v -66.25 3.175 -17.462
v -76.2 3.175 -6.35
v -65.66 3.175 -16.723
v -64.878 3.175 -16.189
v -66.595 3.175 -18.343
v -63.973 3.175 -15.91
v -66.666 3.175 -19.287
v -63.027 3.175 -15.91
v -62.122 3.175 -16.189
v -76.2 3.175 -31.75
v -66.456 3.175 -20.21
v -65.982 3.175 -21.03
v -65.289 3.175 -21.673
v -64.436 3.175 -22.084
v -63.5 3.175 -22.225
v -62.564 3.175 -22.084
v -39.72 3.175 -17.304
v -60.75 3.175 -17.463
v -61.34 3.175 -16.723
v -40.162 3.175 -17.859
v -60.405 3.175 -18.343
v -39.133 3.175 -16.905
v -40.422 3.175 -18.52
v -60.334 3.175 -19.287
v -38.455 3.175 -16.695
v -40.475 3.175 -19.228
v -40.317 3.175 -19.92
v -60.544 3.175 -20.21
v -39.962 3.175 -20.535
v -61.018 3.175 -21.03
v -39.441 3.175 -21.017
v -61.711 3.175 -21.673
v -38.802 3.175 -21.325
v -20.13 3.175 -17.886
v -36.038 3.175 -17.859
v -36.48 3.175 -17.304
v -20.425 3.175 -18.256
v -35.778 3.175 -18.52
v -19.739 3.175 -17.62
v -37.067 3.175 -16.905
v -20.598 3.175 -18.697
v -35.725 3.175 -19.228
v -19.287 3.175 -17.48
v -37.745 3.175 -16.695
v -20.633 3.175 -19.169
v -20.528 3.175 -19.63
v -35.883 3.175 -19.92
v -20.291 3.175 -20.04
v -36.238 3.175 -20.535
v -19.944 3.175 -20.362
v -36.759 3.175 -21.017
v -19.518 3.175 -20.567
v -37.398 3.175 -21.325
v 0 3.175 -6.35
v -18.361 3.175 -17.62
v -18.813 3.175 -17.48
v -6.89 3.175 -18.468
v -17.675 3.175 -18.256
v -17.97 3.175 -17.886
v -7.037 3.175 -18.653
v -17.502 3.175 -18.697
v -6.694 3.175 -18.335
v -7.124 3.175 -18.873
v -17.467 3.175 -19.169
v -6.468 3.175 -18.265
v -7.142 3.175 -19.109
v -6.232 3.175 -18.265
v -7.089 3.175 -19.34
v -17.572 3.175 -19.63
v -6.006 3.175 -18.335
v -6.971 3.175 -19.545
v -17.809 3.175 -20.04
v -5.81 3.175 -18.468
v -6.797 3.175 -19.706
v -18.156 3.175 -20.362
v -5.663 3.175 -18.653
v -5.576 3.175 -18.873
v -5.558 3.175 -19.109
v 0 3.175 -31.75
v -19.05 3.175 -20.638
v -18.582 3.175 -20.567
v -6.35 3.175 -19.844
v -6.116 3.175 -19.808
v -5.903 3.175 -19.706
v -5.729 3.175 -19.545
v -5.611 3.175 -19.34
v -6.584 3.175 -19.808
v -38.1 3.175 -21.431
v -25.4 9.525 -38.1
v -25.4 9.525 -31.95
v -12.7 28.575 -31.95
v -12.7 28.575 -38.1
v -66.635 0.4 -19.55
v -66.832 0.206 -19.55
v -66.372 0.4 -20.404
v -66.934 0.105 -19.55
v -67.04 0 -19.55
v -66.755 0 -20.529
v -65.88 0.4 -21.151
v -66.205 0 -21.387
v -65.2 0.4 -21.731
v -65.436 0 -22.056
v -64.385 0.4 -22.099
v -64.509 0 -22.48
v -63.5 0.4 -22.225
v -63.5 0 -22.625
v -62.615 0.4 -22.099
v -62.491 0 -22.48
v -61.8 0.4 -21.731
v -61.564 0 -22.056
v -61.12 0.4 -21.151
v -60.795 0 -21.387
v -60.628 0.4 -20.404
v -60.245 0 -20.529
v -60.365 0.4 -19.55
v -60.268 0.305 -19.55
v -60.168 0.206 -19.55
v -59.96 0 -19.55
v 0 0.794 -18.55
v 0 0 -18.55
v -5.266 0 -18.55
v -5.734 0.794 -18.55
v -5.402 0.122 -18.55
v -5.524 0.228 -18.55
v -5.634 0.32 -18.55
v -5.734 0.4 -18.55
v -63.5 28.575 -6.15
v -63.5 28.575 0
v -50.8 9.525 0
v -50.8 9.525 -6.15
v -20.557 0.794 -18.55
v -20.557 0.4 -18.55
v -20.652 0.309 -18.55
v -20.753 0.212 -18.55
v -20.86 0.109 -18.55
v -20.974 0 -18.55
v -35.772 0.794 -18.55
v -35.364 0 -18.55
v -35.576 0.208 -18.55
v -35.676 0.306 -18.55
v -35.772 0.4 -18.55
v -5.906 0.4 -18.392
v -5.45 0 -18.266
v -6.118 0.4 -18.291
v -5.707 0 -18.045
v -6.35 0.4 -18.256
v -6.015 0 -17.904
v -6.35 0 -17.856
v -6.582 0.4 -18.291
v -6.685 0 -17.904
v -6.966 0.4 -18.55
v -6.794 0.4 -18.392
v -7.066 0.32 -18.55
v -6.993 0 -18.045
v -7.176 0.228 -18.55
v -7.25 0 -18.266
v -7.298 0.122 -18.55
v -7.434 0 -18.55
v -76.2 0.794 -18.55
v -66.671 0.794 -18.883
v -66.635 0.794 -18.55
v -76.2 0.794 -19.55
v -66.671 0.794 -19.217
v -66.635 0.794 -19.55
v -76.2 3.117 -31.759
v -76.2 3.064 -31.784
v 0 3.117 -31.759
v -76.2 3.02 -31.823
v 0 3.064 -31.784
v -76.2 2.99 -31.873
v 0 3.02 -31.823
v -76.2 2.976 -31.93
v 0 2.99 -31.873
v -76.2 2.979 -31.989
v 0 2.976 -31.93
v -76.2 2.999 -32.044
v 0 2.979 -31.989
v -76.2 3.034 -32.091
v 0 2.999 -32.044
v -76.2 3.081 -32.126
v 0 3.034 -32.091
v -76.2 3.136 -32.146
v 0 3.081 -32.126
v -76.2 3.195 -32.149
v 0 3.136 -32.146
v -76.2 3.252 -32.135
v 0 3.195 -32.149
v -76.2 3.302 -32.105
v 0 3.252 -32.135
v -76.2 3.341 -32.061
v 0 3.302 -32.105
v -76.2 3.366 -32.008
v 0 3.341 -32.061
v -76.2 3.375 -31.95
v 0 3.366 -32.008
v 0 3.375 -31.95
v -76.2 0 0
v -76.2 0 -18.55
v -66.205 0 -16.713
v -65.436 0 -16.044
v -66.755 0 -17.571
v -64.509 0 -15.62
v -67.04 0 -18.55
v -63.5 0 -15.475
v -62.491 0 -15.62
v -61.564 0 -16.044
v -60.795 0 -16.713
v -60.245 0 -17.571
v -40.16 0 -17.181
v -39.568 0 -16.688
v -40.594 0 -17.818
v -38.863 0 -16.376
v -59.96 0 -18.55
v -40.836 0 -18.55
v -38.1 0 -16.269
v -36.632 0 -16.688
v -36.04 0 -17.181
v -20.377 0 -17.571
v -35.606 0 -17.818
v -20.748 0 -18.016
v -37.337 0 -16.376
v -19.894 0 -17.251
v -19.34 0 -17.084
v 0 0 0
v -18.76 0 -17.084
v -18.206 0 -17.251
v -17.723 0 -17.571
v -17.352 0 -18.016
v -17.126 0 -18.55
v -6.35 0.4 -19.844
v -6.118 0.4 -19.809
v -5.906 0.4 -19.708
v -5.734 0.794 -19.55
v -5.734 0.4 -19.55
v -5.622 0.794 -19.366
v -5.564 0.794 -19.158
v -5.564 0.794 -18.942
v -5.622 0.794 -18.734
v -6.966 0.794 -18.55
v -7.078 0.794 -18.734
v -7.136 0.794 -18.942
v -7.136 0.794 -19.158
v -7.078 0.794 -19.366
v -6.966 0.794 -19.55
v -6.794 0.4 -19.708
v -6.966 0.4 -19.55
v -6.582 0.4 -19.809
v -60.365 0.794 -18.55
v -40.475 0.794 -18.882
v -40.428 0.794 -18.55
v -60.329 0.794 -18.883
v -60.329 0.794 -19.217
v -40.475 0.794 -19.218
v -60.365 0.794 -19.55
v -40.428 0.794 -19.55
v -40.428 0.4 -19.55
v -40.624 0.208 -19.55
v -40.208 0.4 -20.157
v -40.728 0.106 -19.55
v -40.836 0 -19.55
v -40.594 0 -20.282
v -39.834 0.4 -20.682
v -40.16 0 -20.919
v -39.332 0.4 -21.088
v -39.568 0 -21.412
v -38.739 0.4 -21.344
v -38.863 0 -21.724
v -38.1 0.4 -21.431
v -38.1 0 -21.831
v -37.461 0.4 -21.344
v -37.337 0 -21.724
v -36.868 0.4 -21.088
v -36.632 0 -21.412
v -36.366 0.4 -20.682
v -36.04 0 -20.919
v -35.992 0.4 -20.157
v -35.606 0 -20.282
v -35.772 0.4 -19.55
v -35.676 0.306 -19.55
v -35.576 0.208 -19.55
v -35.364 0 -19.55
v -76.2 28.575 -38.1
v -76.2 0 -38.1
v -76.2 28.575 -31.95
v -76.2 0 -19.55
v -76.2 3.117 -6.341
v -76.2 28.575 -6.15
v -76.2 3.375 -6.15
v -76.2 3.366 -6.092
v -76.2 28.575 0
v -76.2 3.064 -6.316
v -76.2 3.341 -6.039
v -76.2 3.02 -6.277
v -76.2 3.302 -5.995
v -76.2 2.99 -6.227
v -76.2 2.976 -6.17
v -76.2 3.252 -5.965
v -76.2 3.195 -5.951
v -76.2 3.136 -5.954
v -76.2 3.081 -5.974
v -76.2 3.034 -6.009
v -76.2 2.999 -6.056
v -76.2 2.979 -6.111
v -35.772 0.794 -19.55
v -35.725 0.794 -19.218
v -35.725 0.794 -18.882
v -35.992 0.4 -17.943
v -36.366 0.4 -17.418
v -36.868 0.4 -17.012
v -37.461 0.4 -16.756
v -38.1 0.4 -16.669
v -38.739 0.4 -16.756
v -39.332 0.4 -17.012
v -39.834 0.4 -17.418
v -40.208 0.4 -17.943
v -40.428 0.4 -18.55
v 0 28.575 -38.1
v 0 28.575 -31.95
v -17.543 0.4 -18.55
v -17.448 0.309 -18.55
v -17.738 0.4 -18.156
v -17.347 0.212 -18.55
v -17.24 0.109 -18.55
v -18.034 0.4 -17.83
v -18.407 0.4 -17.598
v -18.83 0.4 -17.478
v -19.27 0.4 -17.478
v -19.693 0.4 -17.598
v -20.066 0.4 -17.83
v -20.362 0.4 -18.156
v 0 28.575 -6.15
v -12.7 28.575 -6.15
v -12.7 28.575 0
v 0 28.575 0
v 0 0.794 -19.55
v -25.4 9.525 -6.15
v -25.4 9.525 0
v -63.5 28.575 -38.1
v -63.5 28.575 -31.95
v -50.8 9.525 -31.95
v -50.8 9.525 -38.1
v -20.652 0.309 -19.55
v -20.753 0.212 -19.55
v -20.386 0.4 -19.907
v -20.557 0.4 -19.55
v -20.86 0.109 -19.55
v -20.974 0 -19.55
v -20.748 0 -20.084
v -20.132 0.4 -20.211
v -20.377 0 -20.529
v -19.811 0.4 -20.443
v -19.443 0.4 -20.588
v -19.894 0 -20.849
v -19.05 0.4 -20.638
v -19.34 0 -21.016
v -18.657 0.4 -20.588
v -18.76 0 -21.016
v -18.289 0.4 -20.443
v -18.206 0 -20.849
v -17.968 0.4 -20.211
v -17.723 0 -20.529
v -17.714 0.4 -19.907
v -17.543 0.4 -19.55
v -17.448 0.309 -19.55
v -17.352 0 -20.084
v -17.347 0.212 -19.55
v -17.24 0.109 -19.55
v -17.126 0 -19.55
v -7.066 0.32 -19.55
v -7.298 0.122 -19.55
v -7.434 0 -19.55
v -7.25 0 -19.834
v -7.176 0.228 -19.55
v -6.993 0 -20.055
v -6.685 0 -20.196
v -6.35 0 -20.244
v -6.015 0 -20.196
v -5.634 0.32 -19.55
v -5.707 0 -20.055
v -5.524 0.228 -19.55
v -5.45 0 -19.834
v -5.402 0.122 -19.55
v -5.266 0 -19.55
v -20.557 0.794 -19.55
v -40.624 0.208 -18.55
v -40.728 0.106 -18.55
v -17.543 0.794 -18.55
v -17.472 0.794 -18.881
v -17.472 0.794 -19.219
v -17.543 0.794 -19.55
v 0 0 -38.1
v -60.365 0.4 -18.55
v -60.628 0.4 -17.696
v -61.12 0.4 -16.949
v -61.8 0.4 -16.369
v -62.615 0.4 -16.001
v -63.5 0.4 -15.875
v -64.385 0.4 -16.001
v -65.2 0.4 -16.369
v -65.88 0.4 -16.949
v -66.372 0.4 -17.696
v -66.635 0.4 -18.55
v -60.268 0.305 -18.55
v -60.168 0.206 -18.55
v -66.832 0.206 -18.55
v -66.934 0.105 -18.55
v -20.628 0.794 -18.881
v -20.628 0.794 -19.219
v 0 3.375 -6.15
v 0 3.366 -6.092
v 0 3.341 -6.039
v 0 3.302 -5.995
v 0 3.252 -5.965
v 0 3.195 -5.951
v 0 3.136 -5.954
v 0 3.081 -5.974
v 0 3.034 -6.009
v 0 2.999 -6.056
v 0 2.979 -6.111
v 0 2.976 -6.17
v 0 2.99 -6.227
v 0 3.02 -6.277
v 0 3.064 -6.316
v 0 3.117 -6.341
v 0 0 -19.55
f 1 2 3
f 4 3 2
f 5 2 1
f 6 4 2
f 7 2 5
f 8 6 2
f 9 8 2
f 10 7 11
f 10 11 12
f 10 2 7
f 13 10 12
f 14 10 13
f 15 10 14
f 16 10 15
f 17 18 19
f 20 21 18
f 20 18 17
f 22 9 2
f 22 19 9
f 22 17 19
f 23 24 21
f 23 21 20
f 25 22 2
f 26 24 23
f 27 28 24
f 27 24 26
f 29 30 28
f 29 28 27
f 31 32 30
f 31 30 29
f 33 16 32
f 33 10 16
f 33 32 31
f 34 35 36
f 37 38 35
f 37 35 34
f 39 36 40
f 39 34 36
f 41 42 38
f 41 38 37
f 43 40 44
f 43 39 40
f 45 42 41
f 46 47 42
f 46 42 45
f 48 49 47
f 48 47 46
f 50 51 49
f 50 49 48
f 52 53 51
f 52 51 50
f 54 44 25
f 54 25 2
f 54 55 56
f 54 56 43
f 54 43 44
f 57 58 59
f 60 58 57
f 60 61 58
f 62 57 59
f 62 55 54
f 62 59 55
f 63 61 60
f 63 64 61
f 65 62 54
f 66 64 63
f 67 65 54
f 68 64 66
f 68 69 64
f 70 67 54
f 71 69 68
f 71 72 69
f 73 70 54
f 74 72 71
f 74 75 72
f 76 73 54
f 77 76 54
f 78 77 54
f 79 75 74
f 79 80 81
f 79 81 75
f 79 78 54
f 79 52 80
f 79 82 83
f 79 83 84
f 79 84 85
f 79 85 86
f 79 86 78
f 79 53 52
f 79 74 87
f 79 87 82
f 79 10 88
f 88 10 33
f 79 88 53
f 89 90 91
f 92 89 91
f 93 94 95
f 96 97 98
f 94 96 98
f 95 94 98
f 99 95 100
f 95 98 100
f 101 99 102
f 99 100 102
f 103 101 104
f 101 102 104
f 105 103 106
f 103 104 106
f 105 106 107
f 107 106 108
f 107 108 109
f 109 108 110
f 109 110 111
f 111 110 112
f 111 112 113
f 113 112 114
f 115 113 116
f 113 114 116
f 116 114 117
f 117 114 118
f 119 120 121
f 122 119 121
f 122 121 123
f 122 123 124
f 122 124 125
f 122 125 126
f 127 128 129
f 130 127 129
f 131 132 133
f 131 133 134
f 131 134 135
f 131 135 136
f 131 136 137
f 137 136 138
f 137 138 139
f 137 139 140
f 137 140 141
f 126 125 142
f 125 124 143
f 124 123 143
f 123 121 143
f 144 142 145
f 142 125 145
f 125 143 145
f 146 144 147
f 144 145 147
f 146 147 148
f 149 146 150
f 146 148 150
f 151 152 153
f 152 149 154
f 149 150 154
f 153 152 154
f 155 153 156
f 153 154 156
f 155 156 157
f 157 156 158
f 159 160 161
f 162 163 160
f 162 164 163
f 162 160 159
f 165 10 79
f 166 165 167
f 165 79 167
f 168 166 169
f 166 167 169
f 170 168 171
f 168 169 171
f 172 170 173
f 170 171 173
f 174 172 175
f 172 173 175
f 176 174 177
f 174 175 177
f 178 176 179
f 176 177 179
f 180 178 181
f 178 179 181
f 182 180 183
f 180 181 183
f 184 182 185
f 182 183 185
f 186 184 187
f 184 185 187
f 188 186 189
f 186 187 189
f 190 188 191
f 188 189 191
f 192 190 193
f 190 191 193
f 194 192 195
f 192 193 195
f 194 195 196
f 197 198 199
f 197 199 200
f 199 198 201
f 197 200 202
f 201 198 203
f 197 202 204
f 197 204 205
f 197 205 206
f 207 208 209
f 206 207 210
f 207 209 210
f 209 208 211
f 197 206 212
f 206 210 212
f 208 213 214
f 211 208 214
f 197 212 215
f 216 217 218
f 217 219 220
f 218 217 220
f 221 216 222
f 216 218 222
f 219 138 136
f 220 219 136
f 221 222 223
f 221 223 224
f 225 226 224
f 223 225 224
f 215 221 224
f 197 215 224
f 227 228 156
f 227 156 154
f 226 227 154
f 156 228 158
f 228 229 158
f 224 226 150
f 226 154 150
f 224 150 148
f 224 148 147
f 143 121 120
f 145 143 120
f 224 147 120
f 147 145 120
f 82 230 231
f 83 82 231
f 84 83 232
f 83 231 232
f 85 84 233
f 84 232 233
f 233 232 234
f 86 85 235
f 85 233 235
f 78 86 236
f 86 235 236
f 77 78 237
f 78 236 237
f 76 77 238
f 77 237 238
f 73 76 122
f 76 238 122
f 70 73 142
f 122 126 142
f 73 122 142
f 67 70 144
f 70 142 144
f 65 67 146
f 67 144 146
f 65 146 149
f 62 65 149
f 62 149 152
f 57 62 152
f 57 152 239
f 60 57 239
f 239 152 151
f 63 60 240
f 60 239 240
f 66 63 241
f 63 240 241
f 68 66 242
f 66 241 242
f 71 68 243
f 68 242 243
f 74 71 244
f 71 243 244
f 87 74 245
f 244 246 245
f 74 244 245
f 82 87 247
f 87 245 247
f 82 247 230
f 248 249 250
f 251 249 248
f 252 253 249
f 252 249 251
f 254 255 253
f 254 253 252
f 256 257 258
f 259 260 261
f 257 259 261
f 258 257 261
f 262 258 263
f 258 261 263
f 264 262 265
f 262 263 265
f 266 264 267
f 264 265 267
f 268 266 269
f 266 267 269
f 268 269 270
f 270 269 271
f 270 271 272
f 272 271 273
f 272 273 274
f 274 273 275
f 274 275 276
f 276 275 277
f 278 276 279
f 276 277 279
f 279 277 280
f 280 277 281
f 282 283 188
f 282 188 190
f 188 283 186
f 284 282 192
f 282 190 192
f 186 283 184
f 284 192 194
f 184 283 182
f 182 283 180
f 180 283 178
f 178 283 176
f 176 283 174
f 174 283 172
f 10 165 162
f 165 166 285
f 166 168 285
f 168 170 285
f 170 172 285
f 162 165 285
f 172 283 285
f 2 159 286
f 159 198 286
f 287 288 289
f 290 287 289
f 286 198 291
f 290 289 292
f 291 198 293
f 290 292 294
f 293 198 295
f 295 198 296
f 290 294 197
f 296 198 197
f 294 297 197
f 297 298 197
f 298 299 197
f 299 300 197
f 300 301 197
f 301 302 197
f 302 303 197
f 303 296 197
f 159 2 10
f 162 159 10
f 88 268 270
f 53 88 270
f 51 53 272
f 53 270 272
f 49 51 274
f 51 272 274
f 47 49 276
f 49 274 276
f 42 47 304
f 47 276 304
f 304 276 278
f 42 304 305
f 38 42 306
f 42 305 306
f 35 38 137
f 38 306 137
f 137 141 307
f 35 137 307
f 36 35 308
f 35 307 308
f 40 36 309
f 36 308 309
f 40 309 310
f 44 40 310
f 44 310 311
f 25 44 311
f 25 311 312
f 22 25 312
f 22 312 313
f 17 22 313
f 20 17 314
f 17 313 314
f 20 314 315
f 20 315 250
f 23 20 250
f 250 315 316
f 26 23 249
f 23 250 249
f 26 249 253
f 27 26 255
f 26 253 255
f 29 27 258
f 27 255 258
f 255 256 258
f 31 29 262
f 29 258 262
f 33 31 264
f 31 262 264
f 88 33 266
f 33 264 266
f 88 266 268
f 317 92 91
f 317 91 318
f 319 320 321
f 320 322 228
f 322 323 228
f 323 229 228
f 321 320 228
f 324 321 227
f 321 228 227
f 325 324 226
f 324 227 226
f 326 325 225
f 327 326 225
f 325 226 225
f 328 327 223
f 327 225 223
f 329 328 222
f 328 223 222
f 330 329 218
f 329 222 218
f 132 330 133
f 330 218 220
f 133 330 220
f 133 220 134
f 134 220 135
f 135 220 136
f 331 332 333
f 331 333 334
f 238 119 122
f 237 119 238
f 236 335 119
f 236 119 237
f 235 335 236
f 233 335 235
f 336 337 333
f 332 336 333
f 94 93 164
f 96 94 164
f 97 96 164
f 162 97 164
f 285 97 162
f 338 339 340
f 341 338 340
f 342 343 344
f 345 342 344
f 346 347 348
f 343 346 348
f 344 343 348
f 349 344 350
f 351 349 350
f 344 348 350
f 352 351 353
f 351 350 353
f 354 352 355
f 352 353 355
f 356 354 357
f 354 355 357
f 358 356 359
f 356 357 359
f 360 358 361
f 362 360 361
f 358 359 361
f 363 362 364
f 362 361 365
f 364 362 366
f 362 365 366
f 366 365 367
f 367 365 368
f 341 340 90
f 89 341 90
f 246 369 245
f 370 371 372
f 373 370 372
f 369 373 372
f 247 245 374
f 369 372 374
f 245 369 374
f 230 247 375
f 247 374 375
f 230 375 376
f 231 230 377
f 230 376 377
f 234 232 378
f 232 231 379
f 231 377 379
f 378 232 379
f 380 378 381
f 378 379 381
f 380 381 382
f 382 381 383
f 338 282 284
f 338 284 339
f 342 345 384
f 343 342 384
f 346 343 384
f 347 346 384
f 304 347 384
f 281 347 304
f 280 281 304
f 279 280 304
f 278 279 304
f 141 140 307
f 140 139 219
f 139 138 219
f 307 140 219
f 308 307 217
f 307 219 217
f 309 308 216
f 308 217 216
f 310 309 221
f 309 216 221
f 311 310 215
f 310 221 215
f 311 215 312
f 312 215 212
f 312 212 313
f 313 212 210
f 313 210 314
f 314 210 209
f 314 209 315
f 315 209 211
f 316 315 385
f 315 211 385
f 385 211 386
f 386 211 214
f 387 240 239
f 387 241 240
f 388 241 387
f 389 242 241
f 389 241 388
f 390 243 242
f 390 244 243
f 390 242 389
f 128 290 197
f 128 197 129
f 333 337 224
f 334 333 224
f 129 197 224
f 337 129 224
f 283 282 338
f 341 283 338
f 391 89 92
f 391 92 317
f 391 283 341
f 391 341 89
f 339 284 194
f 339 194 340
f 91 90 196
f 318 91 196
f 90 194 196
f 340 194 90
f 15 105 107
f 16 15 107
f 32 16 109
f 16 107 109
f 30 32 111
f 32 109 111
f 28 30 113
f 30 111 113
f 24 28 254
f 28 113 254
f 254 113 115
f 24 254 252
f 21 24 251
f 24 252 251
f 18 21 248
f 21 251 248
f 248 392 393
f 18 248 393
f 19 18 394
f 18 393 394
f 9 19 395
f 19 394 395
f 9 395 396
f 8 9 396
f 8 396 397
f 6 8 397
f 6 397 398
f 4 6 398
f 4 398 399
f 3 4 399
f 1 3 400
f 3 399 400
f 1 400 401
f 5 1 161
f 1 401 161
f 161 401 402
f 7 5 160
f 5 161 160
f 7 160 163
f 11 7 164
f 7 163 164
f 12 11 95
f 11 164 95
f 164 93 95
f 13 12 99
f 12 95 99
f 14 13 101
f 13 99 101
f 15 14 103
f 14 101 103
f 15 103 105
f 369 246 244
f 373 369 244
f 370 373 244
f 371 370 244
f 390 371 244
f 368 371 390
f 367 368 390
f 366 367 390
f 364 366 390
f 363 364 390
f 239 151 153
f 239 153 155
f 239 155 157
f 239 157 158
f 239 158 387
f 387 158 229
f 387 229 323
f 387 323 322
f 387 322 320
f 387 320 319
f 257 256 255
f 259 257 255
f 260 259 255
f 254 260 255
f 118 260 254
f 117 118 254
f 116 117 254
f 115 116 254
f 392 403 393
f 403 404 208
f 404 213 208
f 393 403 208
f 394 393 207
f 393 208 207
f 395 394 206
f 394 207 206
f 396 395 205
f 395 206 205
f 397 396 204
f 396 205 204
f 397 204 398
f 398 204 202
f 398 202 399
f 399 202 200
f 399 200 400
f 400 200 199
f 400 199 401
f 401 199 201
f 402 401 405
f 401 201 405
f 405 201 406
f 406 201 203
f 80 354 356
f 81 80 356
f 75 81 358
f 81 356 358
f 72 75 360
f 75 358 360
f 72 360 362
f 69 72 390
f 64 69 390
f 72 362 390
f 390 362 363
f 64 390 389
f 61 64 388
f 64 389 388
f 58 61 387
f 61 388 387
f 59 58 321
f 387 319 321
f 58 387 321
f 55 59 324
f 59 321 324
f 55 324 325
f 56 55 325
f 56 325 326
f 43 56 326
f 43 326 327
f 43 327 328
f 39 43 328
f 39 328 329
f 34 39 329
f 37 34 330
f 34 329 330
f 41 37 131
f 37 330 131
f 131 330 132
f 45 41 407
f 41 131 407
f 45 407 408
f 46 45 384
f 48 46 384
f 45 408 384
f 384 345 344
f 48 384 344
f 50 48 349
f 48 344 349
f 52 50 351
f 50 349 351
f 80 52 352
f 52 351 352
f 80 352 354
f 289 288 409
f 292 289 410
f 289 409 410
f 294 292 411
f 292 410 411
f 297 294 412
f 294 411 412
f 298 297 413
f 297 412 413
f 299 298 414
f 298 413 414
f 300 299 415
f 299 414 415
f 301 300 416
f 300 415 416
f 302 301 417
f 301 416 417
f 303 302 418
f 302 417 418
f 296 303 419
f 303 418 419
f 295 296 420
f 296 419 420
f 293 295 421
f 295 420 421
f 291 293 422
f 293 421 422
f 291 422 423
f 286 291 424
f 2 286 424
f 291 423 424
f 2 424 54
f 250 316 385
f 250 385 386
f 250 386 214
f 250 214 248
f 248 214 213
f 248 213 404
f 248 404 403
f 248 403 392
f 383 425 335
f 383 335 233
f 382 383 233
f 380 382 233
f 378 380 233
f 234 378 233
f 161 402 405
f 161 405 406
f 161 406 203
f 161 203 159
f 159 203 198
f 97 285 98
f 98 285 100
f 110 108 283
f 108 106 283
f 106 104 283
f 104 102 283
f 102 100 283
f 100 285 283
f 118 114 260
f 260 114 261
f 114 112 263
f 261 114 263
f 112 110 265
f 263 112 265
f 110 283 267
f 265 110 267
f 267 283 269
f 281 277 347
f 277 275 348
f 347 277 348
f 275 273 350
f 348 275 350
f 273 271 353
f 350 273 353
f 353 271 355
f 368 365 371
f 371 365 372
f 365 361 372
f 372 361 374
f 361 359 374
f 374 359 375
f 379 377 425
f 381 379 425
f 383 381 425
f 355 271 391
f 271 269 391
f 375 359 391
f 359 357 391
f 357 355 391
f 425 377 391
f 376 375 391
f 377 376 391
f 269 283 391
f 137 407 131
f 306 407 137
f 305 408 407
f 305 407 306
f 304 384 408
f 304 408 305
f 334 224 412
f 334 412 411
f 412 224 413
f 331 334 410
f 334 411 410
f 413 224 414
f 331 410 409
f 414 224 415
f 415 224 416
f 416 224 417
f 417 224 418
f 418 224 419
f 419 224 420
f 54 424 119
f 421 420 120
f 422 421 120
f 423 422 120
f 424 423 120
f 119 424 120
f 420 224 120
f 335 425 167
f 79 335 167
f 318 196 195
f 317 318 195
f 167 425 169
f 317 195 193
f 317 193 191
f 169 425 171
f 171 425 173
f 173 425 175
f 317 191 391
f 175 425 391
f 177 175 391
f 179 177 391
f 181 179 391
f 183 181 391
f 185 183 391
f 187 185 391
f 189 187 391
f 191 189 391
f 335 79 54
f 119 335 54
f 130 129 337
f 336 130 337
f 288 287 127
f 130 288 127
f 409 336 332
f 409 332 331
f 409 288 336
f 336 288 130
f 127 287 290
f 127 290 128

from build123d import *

# Parameters (mm, degrees)
SKETCH2_W             = 76.2
SKETCH2_H             = 6.15
BOSS_EXTRUDE1_DEPTH   = 28.575
BOSS_EXTRUDE1_2_DEPTH = 28.575
SKETCH2_3_W           = 76.2
SKETCH2_3_H           = 25.8
BOSS_EXTRUDE2_DEPTH   = 3.175
CUT_EXTRUDE2_DEPTH    = 90.858670283
SKETCH4_R             = 3.175
SKETCH4_R_2           = 2.38125
SKETCH4_R_3           = 1.5875
SKETCH4_R_4           = 0.79375
CUT_EXTRUDE3_DEPTH    = 90.858670283
SKETCH5_R             = 0.2
CUT_EXTRUDE4_DEPTH    = 90.858670283
CHAMFER1_SIZE         = 0.4
SKETCH6_W             = 76.2
SKETCH6_H             = 1
CUT_EXTRUDE5_DEPTH    = 0.79375


with BuildPart() as part:
    # Sketch2 → Boss-Extrude1 (new body)
    with BuildSketch(Plane(origin=(0, 0, 0), x_dir=(1, 0, 0), z_dir=(0, 1, 0))):
        with Locations((-38.1, 3.075)):
            Rectangle(SKETCH2_W, SKETCH2_H)
    extrude(amount=BOSS_EXTRUDE1_DEPTH)



with BuildPart() as body_2:
    # Sketch2 → Boss-Extrude1 2 (new body)
    with BuildSketch(Plane(origin=(0, 0, 0), x_dir=(1, 0, 0), z_dir=(0, 1, 0))):
        with Locations((-38.1, 35.025)):
            Rectangle(SKETCH2_W, SKETCH2_H)
    extrude(amount=BOSS_EXTRUDE1_2_DEPTH)


with BuildPart() as part_1:
    add(part.part)

    add(body_2.part)  # Boss-Extrude2 merges body 2
    # Sketch2<3> → Boss-Extrude2 (add)
    with BuildSketch(Plane(origin=(0, 0, 0), x_dir=(1, 0, 0), z_dir=(0, 1, 0))):
        with Locations((-38.1, 19.05)):
            Rectangle(SKETCH2_3_W, SKETCH2_3_H)
    extrude(amount=BOSS_EXTRUDE2_DEPTH)

    # Sketch3 → Cut-Extrude2 (cut, through all)
    with BuildSketch(Plane.XY):
        Polygon((-12.7, 28.575), (-63.5, 28.575), (-50.8, 9.525), (-25.4, 9.525), align=None)
    extrude(amount=-CUT_EXTRUDE2_DEPTH, mode=Mode.SUBTRACT)

    # Sketch4 → Cut-Extrude3 (cut, through all)
    with BuildSketch(Plane.XZ):
        with Locations((-63.5, -19.05)):
            Circle(SKETCH4_R)
        with Locations((-38.1, -19.05)):
            Circle(SKETCH4_R_2)
        with Locations((-19.05, -19.05)):
            Circle(SKETCH4_R_3)
        with Locations((-6.35, -19.05)):
            Circle(SKETCH4_R_4)
    extrude(amount=-CUT_EXTRUDE3_DEPTH, mode=Mode.SUBTRACT)

    # Sketch5 → Cut-Extrude4 (cut, through all)
    with BuildSketch(Plane(origin=(0, 0, 0), x_dir=(0, 0, -1), z_dir=(1, 0, 0))):
        with Locations((6.15, 3.175)):
            Circle(SKETCH5_R)
        with Locations((31.95, 3.175)):
            Circle(SKETCH5_R)
    extrude(amount=-CUT_EXTRUDE4_DEPTH, mode=Mode.SUBTRACT)

    # Chamfer1
    chamfer1_edges = [part_1.edges().sort_by_distance(p)[0] for p in [
        (-7.14375, 0, -19.05),
        (-20.6375, 0, -19.05),
        (-40.48125, 0, -19.05),
        (-66.675, 0, -19.05),
    ]]
    chamfer(chamfer1_edges, length=CHAMFER1_SIZE)

    # Sketch6 → Cut-Extrude5 (cut)
    with BuildSketch(Plane(origin=(0, 0, 0), x_dir=(-1, 0, 0), z_dir=(0, -1, 0))):
        with Locations((38.1, 19.05)):
            Rectangle(SKETCH6_W, SKETCH6_H)
    extrude(amount=-CUT_EXTRUDE5_DEPTH, mode=Mode.SUBTRACT)


solid = part_1.part
